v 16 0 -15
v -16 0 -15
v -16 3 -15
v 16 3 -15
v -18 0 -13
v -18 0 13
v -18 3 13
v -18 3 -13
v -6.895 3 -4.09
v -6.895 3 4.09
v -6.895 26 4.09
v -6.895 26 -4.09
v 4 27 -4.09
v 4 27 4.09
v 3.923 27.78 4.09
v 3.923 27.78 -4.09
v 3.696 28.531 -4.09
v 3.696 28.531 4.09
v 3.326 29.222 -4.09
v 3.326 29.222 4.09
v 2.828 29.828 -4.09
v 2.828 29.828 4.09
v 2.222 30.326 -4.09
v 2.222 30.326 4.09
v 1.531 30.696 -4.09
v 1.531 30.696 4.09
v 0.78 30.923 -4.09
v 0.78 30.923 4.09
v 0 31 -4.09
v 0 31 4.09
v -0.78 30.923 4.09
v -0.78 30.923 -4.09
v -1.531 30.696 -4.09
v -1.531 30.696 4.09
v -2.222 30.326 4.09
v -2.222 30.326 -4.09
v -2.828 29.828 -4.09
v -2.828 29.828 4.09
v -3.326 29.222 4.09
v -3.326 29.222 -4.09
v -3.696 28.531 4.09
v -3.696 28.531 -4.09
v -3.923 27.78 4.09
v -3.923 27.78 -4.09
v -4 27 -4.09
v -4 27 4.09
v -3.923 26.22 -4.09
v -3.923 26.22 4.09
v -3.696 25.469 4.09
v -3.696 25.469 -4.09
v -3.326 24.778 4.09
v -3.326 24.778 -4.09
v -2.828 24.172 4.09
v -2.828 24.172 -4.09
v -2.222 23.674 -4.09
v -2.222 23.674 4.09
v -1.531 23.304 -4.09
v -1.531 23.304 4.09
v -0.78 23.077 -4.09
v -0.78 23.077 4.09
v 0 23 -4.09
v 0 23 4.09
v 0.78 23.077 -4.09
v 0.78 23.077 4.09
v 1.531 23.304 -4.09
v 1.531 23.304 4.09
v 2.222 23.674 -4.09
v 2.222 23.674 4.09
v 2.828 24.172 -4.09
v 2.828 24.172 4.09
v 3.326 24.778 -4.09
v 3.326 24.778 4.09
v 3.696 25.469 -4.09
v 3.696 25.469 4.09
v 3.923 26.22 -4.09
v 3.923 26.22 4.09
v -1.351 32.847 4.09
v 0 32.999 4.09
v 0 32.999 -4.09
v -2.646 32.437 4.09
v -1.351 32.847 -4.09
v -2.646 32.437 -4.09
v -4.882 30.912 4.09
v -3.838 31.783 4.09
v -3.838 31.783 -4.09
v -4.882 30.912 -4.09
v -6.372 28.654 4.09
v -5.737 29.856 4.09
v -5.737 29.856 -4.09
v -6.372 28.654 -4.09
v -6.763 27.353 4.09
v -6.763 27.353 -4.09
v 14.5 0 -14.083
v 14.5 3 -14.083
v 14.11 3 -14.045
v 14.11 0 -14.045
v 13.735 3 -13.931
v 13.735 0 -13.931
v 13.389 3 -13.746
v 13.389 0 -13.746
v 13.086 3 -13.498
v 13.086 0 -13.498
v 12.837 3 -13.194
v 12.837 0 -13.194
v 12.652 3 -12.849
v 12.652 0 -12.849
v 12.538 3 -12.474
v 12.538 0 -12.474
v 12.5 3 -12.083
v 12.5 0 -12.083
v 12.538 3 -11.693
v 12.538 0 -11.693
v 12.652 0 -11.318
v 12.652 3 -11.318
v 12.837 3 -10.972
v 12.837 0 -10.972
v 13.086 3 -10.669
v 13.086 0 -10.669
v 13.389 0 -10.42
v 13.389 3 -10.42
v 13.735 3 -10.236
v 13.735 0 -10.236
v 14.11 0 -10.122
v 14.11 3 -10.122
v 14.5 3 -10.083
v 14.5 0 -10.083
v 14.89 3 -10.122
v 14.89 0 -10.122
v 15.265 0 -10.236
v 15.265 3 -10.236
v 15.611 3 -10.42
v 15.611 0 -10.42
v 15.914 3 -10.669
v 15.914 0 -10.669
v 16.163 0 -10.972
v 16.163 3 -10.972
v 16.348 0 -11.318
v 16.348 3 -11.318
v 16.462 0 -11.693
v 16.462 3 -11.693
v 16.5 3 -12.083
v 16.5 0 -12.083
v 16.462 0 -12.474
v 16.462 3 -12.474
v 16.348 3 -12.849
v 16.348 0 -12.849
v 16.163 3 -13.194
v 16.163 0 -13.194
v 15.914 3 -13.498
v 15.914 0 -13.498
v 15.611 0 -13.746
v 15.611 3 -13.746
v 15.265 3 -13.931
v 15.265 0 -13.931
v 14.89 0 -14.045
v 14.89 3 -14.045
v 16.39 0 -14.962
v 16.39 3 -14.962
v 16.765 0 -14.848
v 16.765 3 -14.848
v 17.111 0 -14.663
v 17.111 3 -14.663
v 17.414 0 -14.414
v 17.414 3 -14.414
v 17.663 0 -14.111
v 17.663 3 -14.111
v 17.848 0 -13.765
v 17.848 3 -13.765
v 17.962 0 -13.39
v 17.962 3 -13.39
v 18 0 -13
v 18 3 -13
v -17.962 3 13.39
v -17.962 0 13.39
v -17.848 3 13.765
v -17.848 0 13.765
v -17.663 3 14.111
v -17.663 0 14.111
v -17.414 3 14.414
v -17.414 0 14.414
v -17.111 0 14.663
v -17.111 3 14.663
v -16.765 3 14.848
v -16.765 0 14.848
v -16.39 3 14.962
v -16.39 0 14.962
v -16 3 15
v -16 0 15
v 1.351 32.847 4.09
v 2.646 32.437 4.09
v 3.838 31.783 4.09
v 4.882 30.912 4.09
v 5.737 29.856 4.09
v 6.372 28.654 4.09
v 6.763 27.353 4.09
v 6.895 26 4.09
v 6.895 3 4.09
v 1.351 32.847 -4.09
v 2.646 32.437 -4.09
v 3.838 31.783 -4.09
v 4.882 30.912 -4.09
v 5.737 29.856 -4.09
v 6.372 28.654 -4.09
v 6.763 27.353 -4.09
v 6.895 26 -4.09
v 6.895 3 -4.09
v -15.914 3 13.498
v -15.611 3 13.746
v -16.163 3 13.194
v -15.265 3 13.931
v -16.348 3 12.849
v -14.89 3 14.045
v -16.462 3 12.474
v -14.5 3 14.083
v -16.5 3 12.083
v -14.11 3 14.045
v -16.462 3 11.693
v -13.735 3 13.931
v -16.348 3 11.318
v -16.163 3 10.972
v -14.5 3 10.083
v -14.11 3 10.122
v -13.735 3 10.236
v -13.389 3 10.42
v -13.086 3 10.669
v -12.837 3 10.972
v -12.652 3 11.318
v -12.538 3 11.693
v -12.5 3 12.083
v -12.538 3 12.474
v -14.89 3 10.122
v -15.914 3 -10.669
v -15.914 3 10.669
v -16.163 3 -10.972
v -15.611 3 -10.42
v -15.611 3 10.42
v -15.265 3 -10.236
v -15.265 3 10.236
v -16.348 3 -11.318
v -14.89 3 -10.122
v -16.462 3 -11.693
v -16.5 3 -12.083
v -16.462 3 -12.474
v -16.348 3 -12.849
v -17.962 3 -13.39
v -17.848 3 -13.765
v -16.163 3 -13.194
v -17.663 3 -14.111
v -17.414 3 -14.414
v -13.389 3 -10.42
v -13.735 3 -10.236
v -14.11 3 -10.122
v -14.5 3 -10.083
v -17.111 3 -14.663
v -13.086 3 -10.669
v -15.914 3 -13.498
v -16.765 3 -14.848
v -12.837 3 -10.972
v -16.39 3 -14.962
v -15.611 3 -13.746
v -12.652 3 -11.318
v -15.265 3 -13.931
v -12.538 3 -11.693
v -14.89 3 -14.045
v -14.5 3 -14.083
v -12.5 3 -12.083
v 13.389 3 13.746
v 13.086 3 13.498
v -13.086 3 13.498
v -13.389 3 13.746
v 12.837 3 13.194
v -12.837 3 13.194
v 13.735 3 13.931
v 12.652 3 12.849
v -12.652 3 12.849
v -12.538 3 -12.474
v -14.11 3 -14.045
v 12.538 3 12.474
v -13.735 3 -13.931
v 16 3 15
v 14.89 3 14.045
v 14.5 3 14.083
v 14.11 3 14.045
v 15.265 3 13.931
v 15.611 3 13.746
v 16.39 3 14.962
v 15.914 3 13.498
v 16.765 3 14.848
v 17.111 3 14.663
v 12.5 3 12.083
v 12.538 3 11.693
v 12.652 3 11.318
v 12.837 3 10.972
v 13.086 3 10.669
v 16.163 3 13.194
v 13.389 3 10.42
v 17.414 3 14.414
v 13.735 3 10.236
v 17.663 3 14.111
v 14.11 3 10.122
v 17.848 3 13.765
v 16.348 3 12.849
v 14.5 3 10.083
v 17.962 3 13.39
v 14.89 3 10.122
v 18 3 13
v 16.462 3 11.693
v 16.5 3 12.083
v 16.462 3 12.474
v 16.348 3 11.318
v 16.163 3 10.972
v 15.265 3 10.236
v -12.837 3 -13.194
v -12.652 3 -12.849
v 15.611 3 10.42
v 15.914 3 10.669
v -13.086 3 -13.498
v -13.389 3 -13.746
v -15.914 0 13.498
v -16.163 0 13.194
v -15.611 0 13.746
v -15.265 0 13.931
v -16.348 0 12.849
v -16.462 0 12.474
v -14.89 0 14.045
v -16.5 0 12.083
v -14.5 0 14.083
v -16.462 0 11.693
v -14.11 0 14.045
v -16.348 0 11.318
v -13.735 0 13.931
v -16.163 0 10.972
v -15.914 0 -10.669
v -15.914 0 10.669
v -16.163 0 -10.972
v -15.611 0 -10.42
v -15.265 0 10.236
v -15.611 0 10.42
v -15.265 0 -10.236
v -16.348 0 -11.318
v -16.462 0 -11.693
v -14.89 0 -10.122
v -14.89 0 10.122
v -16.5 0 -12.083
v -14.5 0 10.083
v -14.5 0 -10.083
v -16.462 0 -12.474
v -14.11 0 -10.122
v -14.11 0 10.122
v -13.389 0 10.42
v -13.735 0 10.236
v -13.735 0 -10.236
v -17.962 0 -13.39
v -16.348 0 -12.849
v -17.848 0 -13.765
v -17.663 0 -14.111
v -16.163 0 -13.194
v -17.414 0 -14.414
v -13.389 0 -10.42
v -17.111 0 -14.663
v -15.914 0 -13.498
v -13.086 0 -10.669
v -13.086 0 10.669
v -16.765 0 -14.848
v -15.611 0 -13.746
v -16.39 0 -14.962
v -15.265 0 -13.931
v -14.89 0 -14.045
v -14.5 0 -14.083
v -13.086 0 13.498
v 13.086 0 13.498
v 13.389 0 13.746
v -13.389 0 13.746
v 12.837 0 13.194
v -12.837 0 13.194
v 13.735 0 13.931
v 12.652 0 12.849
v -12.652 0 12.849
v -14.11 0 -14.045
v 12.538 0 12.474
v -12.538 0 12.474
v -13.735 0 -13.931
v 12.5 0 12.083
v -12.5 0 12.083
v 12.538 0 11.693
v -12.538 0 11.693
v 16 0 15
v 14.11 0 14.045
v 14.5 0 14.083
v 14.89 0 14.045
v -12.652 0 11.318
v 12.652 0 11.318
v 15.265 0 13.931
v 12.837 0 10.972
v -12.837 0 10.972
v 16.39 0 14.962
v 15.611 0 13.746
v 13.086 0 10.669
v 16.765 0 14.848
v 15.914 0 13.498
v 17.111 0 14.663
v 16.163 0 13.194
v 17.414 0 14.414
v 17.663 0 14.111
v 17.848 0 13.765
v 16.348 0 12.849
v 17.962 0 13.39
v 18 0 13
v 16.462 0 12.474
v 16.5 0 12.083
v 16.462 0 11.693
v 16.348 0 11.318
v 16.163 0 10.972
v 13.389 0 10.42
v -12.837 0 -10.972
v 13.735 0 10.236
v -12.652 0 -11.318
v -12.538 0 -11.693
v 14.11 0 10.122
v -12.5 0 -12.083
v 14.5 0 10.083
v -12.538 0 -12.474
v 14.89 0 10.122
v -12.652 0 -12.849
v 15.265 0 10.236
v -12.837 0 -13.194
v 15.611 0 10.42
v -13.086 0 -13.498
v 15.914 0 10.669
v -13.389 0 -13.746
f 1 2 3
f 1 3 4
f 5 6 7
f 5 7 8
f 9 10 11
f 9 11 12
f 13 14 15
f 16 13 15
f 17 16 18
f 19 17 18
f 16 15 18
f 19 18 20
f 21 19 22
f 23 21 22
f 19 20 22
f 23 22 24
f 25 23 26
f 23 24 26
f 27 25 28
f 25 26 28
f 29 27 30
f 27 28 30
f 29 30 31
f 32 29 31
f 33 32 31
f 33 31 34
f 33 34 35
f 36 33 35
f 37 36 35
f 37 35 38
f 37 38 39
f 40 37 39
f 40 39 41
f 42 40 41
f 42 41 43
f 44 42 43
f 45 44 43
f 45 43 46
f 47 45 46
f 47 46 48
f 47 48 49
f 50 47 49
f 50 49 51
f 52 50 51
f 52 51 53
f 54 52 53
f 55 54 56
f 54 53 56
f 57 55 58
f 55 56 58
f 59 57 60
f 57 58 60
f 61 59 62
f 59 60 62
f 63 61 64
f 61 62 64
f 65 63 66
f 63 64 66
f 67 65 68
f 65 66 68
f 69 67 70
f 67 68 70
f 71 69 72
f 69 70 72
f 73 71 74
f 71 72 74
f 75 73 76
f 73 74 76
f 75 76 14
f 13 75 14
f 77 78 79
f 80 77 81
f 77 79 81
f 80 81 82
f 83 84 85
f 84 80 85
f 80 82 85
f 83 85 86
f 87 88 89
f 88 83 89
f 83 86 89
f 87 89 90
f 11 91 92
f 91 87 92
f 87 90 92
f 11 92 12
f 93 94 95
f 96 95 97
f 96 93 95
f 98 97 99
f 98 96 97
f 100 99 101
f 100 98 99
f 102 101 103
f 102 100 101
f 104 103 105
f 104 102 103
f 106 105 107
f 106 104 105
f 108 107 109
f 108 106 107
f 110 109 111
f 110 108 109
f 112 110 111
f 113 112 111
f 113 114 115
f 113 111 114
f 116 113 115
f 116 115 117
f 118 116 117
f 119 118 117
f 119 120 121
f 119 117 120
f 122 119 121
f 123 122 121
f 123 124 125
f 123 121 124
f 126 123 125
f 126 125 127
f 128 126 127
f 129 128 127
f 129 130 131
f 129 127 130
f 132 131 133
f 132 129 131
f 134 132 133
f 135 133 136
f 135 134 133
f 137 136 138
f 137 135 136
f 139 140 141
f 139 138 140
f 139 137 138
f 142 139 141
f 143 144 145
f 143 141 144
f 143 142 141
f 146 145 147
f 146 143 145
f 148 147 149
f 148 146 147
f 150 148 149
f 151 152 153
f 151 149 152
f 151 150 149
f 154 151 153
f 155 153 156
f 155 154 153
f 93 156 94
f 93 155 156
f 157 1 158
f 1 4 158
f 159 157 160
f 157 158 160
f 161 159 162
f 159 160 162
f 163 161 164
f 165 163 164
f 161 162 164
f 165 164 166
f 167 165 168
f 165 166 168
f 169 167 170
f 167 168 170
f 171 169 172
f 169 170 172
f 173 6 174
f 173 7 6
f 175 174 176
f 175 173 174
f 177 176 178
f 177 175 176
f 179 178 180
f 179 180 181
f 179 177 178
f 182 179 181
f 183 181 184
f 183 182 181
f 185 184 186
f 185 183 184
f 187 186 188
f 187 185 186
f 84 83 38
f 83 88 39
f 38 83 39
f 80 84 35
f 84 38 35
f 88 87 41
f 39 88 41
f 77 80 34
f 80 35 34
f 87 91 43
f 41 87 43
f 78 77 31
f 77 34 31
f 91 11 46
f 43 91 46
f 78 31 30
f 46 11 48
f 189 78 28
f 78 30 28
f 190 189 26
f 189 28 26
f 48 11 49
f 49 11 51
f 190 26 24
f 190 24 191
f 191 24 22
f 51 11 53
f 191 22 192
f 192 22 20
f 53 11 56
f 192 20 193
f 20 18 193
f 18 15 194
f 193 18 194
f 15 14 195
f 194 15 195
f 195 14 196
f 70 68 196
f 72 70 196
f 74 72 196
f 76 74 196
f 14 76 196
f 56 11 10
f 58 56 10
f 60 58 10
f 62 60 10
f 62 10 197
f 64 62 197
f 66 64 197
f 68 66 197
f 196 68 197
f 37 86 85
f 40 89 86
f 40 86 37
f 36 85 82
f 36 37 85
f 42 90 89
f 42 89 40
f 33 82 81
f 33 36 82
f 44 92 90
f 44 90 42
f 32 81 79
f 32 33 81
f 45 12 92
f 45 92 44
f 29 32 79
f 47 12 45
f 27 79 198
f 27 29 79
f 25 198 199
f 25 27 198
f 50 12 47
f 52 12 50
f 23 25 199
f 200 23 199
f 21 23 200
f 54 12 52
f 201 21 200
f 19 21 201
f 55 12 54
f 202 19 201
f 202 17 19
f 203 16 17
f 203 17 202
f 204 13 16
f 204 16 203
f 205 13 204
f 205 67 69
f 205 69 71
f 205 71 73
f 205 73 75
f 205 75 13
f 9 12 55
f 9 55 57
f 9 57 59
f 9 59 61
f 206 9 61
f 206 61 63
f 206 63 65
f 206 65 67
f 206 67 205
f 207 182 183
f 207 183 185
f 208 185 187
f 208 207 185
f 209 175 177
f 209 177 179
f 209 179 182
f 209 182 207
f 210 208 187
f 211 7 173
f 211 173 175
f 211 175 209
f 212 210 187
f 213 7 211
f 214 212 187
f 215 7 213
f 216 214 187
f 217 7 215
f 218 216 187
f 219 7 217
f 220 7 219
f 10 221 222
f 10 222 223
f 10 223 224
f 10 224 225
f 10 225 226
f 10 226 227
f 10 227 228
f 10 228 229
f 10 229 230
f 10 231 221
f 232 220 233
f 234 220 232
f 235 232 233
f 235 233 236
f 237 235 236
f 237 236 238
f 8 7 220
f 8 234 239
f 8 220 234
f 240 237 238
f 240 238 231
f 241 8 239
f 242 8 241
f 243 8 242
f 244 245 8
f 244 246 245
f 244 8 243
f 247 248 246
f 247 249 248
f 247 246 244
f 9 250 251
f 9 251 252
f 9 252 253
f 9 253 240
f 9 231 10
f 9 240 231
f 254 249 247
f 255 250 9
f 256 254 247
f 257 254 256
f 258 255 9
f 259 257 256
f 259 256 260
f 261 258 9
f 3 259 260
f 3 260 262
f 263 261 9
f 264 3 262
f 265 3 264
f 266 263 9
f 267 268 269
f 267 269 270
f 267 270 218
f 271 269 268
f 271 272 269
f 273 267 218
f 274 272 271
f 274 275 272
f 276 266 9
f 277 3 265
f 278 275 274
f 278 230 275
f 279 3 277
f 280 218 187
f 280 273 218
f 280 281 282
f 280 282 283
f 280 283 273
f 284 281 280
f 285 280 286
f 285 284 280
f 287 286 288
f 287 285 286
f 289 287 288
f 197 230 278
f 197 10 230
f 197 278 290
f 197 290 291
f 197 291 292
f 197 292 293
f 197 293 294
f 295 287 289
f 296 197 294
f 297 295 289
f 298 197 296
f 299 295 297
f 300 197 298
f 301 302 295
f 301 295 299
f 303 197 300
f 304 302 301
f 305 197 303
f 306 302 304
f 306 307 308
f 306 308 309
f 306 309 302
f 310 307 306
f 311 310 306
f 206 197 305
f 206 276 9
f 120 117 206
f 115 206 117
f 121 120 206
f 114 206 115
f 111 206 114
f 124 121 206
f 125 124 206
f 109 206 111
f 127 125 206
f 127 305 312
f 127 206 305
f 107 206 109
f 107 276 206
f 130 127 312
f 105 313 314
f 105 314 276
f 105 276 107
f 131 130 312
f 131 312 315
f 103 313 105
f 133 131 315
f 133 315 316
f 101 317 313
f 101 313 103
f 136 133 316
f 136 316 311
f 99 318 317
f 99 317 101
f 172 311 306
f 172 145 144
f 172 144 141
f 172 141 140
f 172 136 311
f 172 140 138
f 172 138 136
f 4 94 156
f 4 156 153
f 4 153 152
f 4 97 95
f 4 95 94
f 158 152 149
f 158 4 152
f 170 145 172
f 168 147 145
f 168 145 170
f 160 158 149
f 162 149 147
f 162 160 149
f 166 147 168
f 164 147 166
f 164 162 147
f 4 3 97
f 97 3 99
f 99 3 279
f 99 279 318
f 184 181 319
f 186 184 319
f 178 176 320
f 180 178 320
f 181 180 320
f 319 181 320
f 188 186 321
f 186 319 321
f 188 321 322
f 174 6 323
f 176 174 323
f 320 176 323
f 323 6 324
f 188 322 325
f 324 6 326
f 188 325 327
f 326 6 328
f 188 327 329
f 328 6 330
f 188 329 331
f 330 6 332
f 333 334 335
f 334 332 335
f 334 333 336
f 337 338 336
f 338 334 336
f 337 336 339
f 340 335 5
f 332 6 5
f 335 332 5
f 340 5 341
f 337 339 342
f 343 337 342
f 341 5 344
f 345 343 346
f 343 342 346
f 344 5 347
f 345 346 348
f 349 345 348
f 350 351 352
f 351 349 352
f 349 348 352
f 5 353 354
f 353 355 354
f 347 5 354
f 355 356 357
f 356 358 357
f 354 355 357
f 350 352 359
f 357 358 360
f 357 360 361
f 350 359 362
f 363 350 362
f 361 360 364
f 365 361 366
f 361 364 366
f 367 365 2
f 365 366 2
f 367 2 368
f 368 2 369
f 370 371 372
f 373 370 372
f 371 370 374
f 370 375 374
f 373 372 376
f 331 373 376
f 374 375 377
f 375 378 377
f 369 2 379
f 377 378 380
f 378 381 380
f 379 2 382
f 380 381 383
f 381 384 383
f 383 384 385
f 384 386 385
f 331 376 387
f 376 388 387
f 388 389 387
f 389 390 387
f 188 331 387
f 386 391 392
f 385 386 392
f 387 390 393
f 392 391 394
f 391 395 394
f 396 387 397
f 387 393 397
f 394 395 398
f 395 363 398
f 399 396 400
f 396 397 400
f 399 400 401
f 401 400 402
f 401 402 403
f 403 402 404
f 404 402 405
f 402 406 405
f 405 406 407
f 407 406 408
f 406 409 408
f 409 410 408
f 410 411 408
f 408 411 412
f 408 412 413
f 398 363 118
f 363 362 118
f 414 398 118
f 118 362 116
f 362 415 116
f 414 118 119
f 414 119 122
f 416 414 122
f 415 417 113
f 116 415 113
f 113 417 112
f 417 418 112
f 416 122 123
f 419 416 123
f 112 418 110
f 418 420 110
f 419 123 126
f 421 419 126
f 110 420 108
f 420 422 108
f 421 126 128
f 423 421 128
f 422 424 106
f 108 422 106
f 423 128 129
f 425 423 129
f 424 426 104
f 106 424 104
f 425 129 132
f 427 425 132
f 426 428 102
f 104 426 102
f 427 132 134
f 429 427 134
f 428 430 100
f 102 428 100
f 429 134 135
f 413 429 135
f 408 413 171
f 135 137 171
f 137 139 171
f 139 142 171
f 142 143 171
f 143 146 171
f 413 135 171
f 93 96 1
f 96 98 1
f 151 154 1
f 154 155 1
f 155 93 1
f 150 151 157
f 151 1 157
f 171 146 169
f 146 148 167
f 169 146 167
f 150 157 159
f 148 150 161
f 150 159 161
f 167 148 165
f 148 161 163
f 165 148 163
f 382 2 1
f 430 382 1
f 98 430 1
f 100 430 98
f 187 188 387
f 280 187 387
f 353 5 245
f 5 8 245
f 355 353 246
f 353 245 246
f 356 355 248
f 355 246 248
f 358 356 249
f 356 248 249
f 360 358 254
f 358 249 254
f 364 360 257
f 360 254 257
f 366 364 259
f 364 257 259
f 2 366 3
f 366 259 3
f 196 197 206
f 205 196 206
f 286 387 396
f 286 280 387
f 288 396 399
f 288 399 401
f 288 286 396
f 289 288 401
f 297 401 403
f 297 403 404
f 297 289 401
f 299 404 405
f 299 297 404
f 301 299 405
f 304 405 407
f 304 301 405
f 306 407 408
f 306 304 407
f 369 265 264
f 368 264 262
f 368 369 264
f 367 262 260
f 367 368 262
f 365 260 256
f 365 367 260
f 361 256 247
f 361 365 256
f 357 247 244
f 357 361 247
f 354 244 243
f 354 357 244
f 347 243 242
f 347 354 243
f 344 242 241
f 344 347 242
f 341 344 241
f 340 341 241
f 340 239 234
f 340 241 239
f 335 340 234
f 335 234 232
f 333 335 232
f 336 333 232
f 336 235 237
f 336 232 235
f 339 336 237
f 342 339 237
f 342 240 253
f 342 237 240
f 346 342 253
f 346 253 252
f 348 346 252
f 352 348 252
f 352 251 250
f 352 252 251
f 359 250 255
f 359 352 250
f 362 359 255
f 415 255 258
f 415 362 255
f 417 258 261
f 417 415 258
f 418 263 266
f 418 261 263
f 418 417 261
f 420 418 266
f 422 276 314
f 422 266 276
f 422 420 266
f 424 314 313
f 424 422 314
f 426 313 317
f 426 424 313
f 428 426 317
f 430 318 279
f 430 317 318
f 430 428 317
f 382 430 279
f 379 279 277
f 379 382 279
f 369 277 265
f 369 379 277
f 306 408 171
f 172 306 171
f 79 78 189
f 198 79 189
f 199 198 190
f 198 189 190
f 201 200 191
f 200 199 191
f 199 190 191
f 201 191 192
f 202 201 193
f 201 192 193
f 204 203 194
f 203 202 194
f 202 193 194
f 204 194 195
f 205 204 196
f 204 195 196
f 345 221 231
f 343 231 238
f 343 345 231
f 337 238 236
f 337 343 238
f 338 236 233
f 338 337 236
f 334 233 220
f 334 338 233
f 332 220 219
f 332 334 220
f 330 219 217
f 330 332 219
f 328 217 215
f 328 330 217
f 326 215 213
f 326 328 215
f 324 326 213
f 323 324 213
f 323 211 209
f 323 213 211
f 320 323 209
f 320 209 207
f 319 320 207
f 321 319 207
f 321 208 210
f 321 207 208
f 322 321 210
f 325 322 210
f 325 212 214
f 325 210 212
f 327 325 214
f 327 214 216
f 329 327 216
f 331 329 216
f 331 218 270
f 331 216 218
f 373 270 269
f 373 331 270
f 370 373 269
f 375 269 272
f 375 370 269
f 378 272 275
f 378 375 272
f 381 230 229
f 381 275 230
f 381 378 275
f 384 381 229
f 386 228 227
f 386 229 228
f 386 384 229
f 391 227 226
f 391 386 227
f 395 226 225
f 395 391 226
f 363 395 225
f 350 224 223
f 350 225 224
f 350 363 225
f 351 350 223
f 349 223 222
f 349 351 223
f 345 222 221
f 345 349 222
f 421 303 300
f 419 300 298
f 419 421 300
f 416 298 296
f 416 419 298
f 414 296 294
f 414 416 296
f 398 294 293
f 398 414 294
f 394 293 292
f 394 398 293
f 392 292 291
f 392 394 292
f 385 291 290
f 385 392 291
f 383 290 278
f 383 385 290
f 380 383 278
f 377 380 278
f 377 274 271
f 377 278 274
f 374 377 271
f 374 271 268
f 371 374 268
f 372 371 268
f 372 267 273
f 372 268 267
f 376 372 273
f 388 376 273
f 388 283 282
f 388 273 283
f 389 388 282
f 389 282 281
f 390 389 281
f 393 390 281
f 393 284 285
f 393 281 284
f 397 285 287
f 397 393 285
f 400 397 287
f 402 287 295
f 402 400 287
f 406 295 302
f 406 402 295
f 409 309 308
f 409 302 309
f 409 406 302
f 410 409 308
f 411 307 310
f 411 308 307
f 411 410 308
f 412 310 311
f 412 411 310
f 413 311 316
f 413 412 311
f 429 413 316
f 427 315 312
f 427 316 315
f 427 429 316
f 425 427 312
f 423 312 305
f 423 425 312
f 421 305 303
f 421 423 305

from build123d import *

# Parameters (mm, degrees)
SKETCH1_W           = 36
SKETCH1_H           = 30
BOSS_EXTRUDE1_DEPTH = 3
SKETCH2_W           = 13.789302678
SKETCH2_H           = 8.180966888
BOSS_EXTRUDE2_DEPTH = 30
FILLET1_R           = 2
FILLET2_R           = 7
SKETCH3_R           = 4
CUT_EXTRUDE1_DEPTH  = 13
SKETCH1_4_R         = 2
CUT_EXTRUDE2_DEPTH  = 4


with BuildPart() as part:
    # Sketch1 → Boss-Extrude1 (new body)
    with BuildSketch(Plane(origin=(0, 0, 0), x_dir=(1, 0, 0), z_dir=(0, 1, 0))):
        Rectangle(SKETCH1_W, SKETCH1_H)
    extrude(amount=BOSS_EXTRUDE1_DEPTH)

    # Sketch2 → Boss-Extrude2 (add)
    with BuildSketch(Plane(origin=(0, 3, 0), x_dir=(1, 0, 0), z_dir=(0, 1, 0))):
        Rectangle(SKETCH2_W, SKETCH2_H)
    extrude(amount=BOSS_EXTRUDE2_DEPTH)

    # Fillet1
    fillet1_edges = [part.edges().sort_by_distance(p)[0] for p in [
        (-18, 1.5, 15),
        (18, 1.5, 15),
        (18, 1.5, -15),
        (-18, 1.5, -15),
    ]]
    fillet(fillet1_edges, radius=FILLET1_R)

    # Fillet2
    # the kernel refuses this fillet: 7 mm, written as the material it takes off along each edge
    with BuildSketch(Plane(origin=(6.894651339, 33, 21.590483444), x_dir=(0, -1, 0), z_dir=(0, 0, -1)), Plane(origin=(-6.894651339, 33, -21.590483444), x_dir=(0, -1, 0), z_dir=(0, 0, 1))) as fillet2_piece_1:
        with BuildLine():
            CenterArc((FILLET2_R, FILLET2_R), FILLET2_R, 180, 90)
            Line((0, FILLET2_R), (0, 0))
            Line((0, 0), (FILLET2_R, 0))
        make_face()
    extrude(amount=43.180966887, mode=Mode.SUBTRACT)

    # Sketch3 → Cut-Extrude1 (cut)
    with BuildSketch(Plane.XY.offset(4.090483444)):
        with Locations((0, 27)):
            Circle(SKETCH3_R)
    extrude(amount=-CUT_EXTRUDE1_DEPTH, mode=Mode.SUBTRACT)

    # Sketch1<4> → Cut-Extrude2 (cut)
    with BuildSketch(Plane(origin=(0, 0, 0), x_dir=(1, 0, 0), z_dir=(0, 1, 0))):
        with Locations(Location((-14.5, 12.083333333, 0), (0, 0, 90))):
            Circle(SKETCH1_4_R)
        with Locations(Location((14.5, 12.083333333, 0), (0, 0, 90))):
            Circle(SKETCH1_4_R)
        with Locations(Location((14.5, -12.083333333, 0), (0, 0, 90))):
            Circle(SKETCH1_4_R)
        with Locations(Location((-14.5, -12.083333333, 0), (0, 0, 90))):
            Circle(SKETCH1_4_R)
    extrude(amount=CUT_EXTRUDE2_DEPTH, mode=Mode.SUBTRACT)


solid = part.part
